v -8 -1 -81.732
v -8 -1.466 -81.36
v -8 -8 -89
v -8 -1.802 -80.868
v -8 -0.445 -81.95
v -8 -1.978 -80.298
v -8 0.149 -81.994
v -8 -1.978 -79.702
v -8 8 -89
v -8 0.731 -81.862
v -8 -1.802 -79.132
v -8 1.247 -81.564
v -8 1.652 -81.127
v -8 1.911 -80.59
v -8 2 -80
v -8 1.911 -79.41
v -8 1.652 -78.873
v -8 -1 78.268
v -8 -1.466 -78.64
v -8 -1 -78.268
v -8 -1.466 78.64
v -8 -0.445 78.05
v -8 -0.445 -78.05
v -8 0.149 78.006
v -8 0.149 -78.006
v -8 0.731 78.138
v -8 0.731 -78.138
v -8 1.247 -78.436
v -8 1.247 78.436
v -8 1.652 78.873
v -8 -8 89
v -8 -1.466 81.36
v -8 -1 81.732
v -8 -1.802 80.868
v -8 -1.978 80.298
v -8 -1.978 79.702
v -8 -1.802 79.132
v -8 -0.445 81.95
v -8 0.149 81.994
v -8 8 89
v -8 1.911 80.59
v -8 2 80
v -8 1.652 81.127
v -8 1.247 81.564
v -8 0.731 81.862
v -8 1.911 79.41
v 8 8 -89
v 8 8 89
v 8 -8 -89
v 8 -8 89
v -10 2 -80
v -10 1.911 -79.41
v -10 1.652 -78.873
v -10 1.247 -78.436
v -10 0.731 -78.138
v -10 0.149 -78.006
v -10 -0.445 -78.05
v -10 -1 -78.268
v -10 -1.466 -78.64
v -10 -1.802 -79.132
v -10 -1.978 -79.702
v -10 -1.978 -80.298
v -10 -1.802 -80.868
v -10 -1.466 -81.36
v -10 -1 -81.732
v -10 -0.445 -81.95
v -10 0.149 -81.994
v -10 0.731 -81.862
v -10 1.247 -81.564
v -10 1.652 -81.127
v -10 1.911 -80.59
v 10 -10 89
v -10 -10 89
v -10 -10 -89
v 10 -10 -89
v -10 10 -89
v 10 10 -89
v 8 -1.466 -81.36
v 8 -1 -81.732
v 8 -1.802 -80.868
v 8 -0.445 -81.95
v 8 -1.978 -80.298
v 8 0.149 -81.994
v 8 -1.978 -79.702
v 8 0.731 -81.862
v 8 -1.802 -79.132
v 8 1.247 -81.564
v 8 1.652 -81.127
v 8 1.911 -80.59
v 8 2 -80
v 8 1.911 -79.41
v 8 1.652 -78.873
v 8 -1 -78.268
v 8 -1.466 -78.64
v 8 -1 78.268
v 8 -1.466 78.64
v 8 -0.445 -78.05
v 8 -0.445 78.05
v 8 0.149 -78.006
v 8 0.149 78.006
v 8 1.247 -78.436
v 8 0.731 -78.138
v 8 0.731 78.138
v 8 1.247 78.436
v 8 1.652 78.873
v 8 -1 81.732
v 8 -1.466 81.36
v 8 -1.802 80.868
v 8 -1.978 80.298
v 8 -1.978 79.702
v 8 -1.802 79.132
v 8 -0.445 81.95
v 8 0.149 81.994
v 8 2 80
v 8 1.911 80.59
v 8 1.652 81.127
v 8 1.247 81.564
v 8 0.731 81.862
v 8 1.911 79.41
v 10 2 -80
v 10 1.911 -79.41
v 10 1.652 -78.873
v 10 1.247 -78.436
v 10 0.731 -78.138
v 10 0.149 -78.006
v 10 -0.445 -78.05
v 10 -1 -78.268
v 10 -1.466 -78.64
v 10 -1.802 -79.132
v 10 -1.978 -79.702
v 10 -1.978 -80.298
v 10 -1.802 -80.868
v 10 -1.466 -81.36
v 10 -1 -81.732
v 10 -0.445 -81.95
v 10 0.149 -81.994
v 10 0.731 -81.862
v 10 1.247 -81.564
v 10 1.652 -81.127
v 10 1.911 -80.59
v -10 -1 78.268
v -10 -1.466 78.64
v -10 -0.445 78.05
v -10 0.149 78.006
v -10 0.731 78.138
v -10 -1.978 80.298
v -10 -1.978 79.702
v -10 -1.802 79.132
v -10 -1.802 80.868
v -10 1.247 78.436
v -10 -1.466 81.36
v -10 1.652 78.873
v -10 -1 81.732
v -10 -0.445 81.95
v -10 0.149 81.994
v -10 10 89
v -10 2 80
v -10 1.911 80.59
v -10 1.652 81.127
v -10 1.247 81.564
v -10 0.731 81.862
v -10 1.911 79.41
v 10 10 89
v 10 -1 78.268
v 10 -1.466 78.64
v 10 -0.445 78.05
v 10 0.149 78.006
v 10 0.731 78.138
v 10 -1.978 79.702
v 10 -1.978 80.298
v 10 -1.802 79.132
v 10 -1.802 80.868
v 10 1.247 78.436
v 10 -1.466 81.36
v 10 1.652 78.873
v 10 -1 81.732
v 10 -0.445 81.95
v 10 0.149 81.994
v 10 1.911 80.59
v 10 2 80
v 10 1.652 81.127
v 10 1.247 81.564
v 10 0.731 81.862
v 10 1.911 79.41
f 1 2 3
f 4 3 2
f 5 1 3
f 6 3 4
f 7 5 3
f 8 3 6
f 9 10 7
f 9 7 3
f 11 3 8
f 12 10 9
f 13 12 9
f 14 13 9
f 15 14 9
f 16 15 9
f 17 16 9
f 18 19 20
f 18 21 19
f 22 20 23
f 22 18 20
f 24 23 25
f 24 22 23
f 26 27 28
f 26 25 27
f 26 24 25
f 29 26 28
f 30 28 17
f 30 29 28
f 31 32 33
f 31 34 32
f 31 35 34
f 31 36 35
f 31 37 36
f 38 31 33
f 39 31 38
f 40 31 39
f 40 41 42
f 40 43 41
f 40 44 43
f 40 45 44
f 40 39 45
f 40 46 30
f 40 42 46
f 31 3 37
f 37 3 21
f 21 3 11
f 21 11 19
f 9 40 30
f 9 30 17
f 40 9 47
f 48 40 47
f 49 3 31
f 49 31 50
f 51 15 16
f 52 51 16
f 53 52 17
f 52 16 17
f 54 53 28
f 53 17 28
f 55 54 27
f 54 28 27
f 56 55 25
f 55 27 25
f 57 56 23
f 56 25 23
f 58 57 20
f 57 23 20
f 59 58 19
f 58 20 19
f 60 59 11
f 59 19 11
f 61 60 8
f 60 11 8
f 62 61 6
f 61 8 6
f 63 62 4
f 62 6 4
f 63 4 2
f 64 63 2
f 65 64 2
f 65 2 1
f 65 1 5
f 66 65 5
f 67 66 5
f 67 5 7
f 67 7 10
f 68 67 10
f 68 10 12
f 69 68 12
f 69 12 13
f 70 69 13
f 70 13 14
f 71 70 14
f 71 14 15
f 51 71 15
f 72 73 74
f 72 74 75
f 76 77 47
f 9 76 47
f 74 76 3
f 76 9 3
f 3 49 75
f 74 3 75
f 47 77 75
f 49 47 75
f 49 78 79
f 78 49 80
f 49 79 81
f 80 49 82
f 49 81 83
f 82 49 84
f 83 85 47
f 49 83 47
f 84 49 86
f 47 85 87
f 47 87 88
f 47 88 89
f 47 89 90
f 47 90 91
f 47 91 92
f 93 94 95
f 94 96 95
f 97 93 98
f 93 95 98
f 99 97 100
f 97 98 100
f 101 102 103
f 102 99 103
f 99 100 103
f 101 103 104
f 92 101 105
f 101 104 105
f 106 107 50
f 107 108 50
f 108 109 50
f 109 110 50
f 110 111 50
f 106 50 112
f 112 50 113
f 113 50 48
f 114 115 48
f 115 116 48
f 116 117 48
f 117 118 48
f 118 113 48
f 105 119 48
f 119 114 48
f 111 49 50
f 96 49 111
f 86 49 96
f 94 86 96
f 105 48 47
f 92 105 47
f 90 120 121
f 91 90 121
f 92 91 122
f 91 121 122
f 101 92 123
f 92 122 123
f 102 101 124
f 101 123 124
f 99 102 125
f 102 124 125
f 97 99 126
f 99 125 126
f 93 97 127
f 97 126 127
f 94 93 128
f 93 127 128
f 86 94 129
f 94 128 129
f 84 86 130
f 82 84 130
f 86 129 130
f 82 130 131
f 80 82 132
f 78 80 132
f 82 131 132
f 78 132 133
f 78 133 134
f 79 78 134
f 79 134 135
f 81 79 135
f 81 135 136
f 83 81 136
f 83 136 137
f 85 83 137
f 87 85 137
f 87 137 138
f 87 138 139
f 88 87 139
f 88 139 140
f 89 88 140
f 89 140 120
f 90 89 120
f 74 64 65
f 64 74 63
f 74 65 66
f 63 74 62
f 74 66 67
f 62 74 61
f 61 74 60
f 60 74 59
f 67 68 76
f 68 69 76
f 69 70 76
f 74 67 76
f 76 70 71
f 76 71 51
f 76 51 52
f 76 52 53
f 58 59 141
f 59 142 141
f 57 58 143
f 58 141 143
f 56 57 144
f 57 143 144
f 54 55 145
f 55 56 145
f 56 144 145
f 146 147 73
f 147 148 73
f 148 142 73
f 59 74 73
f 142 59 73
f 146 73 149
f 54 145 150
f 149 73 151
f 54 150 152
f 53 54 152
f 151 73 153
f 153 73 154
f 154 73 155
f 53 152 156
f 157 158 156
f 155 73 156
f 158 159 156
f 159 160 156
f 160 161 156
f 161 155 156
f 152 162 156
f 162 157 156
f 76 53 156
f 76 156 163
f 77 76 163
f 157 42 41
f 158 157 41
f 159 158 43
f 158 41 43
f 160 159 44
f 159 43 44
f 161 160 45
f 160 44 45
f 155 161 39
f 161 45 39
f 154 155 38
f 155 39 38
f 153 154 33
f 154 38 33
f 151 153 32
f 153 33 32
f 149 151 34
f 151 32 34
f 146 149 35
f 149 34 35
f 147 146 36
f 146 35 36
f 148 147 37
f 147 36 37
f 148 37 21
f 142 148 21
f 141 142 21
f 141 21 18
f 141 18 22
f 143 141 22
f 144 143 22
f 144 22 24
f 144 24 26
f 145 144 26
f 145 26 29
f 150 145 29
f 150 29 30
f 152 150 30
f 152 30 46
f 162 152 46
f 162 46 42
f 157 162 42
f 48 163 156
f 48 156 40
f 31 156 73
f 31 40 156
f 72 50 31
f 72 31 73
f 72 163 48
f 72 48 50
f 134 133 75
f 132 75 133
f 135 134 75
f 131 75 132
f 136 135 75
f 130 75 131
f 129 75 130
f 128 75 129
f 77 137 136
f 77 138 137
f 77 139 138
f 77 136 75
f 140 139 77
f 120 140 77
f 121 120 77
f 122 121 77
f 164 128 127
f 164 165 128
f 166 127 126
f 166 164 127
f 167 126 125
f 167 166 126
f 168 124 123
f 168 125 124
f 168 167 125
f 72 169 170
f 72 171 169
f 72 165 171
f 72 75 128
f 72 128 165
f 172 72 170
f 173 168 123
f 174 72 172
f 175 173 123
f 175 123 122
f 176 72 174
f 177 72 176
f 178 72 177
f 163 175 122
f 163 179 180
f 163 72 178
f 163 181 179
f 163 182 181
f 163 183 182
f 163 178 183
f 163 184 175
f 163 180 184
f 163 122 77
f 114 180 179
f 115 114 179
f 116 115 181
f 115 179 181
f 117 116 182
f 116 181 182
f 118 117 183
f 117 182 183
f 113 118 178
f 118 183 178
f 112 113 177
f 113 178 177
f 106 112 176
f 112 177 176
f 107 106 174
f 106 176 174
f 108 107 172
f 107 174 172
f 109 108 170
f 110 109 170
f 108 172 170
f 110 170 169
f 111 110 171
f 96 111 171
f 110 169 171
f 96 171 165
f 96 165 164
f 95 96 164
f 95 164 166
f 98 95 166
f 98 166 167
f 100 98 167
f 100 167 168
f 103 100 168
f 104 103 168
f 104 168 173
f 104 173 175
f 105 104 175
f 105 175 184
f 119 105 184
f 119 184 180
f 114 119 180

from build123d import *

# Parameters (mm, degrees)
SKETCH_1_W          = 20
SKETCH_1_H          = 20
SKETCH_1_W_2        = 16
SKETCH_1_H_2        = 16
EXTRUDE_1_DEPTH     = 90
SKETCH_2_R          = 2
CUT_EXTRUDE_1_DEPTH = 93.736184955
CUT_EXTRUDE_2_DEPTH = 93.736184955


with BuildPart() as part:
    # 草图1 → 凸台-拉伸1 (new, symmetric)
    with BuildSketch(Plane.XY):
        Rectangle(SKETCH_1_W, SKETCH_1_H)
        Rectangle(SKETCH_1_W_2, SKETCH_1_H_2, mode=Mode.SUBTRACT)
    extrude(amount=EXTRUDE_1_DEPTH, both=True)

    # 草图2 → 切除-拉伸1 (cut, through all)
    with BuildSketch(Plane(origin=(10, 0, 0), x_dir=(0, 0, -1), z_dir=(1, 0, 0))):
        with Locations(Location((80, 0, 0), (0, 0, 90))):
            Circle(SKETCH_2_R)
        with Locations(Location((-80, 0, 0), (0, 0, 90))):
            Circle(SKETCH_2_R)
    extrude(amount=-CUT_EXTRUDE_1_DEPTH, mode=Mode.SUBTRACT)

    # 草图3 → 切除-拉伸2 (cut, through all)
    with BuildSketch(Plane(origin=(10, 0, 0), x_dir=(0, 0, -1), z_dir=(1, 0, 0))):
        Polygon((-90, 10), (-89, 10), (-89, -15.299098046), (-95.501418201, -15.299098046), (-95.501418201, 10), align=None)
        Polygon((89, -15.299098046), (95.501418201, -15.299098046), (95.501418201, 10), (90, 10), (89, 10), align=None)
    extrude(amount=-CUT_EXTRUDE_2_DEPTH, mode=Mode.SUBTRACT)


solid = part.part
